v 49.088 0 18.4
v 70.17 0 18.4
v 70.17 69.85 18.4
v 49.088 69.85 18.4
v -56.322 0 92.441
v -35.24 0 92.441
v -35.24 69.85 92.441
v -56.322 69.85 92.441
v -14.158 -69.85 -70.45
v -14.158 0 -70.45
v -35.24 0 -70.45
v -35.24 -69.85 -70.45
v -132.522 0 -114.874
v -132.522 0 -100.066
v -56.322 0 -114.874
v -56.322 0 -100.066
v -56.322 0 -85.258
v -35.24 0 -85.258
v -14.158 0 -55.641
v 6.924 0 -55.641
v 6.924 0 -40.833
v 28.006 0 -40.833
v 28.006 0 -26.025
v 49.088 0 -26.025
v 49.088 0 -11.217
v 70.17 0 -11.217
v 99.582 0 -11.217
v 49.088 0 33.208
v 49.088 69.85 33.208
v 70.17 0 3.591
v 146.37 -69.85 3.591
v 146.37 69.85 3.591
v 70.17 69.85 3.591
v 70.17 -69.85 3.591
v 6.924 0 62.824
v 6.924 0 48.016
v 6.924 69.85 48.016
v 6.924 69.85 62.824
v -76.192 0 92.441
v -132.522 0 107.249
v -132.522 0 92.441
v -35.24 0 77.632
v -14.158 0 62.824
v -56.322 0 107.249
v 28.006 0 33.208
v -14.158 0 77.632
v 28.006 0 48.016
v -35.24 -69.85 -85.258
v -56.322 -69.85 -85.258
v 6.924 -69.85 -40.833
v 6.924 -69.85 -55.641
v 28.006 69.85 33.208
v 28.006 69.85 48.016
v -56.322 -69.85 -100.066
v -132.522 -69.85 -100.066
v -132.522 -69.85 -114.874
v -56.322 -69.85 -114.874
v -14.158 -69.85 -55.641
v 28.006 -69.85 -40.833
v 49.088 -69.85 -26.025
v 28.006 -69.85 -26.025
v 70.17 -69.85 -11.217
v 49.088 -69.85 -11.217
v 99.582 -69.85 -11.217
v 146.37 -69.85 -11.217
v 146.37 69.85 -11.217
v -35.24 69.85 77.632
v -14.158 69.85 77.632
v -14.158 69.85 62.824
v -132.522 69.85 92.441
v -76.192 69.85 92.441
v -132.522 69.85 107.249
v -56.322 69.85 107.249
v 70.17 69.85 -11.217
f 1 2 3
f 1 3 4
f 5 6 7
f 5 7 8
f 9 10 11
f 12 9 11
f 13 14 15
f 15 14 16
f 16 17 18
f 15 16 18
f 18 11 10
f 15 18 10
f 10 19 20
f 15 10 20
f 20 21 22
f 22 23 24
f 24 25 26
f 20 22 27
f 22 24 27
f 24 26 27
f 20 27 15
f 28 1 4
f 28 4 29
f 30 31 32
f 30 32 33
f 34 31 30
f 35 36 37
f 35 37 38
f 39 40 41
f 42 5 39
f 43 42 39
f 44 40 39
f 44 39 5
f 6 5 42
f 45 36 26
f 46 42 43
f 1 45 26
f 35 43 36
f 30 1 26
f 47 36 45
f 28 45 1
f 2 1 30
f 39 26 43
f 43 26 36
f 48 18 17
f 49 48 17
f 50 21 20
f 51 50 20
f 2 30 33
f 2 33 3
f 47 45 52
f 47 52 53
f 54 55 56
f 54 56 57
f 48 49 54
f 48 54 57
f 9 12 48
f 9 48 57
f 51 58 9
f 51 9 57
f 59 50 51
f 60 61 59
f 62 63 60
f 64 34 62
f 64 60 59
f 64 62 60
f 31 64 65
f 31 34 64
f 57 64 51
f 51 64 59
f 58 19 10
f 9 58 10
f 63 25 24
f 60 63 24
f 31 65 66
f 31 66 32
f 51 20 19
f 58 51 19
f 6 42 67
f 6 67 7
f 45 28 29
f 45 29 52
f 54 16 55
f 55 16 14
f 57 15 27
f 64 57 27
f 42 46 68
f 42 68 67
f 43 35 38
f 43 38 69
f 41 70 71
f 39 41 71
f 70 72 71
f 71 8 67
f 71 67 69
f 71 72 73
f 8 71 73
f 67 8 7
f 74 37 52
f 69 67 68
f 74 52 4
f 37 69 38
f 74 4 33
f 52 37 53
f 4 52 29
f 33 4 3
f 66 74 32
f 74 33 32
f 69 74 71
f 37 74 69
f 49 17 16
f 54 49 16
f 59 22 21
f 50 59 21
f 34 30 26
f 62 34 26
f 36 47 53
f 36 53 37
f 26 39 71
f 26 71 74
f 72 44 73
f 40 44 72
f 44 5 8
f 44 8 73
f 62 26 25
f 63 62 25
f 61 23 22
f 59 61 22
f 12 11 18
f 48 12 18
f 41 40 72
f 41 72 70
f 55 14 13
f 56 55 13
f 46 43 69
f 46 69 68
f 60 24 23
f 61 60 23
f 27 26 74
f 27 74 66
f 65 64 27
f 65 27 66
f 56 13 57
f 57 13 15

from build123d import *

# Parameters (mm, degrees)
F1_DEPTH = 69.85
F2_DEPTH = 69.85


with BuildPart() as f1:
    # F0 (on Front) → F1 (new body)
    with BuildSketch(Plane.XZ):
        Polygon((-132.521941, -100.065994), (-132.521941, -114.874194), (-56.321941, -114.874194), (99.58236, -11.216794), (70.170059, -11.216794), (49.088059, -11.216794), (49.088059, -26.024994), (28.006059, -26.024994), (28.006059, -40.833194), (6.924059, -40.833194), (6.924059, -55.641394), (-14.157941, -55.641394), (-14.157941, -70.449594), (-35.239941, -70.449594), (-35.239941, -85.257794), (-56.321941, -85.257794), (-56.321941, -100.065994), align=None)
        Polygon((70.170059, -11.216794), (99.58236, -11.216794), (146.370059, -11.216794), (146.370059, 3.591406), (70.170059, 3.591406), align=None)
    extrude(amount=F1_DEPTH)

    # F0 (on Front) → F2 (join)
    with BuildSketch(Plane.XZ):
        Polygon((-76.192113, 92.440606), (70.170059, -11.216794), (70.170059, 3.591406), (70.170059, 18.399606), (49.088059, 18.399606), (49.088059, 33.207806), (28.006059, 33.207806), (28.006059, 48.016006), (6.924059, 48.016006), (6.924059, 62.824206), (-14.157941, 62.824206), (-14.157941, 77.632406), (-35.239941, 77.632406), (-35.239941, 92.440606), (-56.321941, 92.440606), (-56.321941, 107.248806), (-132.521941, 107.248806), (-132.521941, 92.440606), align=None)
        Polygon((70.170059, -11.216794), (99.58236, -11.216794), (146.370059, -11.216794), (146.370059, 3.591406), (70.170059, 3.591406), align=None)
    extrude(amount=-F2_DEPTH)


solid = f1.part
